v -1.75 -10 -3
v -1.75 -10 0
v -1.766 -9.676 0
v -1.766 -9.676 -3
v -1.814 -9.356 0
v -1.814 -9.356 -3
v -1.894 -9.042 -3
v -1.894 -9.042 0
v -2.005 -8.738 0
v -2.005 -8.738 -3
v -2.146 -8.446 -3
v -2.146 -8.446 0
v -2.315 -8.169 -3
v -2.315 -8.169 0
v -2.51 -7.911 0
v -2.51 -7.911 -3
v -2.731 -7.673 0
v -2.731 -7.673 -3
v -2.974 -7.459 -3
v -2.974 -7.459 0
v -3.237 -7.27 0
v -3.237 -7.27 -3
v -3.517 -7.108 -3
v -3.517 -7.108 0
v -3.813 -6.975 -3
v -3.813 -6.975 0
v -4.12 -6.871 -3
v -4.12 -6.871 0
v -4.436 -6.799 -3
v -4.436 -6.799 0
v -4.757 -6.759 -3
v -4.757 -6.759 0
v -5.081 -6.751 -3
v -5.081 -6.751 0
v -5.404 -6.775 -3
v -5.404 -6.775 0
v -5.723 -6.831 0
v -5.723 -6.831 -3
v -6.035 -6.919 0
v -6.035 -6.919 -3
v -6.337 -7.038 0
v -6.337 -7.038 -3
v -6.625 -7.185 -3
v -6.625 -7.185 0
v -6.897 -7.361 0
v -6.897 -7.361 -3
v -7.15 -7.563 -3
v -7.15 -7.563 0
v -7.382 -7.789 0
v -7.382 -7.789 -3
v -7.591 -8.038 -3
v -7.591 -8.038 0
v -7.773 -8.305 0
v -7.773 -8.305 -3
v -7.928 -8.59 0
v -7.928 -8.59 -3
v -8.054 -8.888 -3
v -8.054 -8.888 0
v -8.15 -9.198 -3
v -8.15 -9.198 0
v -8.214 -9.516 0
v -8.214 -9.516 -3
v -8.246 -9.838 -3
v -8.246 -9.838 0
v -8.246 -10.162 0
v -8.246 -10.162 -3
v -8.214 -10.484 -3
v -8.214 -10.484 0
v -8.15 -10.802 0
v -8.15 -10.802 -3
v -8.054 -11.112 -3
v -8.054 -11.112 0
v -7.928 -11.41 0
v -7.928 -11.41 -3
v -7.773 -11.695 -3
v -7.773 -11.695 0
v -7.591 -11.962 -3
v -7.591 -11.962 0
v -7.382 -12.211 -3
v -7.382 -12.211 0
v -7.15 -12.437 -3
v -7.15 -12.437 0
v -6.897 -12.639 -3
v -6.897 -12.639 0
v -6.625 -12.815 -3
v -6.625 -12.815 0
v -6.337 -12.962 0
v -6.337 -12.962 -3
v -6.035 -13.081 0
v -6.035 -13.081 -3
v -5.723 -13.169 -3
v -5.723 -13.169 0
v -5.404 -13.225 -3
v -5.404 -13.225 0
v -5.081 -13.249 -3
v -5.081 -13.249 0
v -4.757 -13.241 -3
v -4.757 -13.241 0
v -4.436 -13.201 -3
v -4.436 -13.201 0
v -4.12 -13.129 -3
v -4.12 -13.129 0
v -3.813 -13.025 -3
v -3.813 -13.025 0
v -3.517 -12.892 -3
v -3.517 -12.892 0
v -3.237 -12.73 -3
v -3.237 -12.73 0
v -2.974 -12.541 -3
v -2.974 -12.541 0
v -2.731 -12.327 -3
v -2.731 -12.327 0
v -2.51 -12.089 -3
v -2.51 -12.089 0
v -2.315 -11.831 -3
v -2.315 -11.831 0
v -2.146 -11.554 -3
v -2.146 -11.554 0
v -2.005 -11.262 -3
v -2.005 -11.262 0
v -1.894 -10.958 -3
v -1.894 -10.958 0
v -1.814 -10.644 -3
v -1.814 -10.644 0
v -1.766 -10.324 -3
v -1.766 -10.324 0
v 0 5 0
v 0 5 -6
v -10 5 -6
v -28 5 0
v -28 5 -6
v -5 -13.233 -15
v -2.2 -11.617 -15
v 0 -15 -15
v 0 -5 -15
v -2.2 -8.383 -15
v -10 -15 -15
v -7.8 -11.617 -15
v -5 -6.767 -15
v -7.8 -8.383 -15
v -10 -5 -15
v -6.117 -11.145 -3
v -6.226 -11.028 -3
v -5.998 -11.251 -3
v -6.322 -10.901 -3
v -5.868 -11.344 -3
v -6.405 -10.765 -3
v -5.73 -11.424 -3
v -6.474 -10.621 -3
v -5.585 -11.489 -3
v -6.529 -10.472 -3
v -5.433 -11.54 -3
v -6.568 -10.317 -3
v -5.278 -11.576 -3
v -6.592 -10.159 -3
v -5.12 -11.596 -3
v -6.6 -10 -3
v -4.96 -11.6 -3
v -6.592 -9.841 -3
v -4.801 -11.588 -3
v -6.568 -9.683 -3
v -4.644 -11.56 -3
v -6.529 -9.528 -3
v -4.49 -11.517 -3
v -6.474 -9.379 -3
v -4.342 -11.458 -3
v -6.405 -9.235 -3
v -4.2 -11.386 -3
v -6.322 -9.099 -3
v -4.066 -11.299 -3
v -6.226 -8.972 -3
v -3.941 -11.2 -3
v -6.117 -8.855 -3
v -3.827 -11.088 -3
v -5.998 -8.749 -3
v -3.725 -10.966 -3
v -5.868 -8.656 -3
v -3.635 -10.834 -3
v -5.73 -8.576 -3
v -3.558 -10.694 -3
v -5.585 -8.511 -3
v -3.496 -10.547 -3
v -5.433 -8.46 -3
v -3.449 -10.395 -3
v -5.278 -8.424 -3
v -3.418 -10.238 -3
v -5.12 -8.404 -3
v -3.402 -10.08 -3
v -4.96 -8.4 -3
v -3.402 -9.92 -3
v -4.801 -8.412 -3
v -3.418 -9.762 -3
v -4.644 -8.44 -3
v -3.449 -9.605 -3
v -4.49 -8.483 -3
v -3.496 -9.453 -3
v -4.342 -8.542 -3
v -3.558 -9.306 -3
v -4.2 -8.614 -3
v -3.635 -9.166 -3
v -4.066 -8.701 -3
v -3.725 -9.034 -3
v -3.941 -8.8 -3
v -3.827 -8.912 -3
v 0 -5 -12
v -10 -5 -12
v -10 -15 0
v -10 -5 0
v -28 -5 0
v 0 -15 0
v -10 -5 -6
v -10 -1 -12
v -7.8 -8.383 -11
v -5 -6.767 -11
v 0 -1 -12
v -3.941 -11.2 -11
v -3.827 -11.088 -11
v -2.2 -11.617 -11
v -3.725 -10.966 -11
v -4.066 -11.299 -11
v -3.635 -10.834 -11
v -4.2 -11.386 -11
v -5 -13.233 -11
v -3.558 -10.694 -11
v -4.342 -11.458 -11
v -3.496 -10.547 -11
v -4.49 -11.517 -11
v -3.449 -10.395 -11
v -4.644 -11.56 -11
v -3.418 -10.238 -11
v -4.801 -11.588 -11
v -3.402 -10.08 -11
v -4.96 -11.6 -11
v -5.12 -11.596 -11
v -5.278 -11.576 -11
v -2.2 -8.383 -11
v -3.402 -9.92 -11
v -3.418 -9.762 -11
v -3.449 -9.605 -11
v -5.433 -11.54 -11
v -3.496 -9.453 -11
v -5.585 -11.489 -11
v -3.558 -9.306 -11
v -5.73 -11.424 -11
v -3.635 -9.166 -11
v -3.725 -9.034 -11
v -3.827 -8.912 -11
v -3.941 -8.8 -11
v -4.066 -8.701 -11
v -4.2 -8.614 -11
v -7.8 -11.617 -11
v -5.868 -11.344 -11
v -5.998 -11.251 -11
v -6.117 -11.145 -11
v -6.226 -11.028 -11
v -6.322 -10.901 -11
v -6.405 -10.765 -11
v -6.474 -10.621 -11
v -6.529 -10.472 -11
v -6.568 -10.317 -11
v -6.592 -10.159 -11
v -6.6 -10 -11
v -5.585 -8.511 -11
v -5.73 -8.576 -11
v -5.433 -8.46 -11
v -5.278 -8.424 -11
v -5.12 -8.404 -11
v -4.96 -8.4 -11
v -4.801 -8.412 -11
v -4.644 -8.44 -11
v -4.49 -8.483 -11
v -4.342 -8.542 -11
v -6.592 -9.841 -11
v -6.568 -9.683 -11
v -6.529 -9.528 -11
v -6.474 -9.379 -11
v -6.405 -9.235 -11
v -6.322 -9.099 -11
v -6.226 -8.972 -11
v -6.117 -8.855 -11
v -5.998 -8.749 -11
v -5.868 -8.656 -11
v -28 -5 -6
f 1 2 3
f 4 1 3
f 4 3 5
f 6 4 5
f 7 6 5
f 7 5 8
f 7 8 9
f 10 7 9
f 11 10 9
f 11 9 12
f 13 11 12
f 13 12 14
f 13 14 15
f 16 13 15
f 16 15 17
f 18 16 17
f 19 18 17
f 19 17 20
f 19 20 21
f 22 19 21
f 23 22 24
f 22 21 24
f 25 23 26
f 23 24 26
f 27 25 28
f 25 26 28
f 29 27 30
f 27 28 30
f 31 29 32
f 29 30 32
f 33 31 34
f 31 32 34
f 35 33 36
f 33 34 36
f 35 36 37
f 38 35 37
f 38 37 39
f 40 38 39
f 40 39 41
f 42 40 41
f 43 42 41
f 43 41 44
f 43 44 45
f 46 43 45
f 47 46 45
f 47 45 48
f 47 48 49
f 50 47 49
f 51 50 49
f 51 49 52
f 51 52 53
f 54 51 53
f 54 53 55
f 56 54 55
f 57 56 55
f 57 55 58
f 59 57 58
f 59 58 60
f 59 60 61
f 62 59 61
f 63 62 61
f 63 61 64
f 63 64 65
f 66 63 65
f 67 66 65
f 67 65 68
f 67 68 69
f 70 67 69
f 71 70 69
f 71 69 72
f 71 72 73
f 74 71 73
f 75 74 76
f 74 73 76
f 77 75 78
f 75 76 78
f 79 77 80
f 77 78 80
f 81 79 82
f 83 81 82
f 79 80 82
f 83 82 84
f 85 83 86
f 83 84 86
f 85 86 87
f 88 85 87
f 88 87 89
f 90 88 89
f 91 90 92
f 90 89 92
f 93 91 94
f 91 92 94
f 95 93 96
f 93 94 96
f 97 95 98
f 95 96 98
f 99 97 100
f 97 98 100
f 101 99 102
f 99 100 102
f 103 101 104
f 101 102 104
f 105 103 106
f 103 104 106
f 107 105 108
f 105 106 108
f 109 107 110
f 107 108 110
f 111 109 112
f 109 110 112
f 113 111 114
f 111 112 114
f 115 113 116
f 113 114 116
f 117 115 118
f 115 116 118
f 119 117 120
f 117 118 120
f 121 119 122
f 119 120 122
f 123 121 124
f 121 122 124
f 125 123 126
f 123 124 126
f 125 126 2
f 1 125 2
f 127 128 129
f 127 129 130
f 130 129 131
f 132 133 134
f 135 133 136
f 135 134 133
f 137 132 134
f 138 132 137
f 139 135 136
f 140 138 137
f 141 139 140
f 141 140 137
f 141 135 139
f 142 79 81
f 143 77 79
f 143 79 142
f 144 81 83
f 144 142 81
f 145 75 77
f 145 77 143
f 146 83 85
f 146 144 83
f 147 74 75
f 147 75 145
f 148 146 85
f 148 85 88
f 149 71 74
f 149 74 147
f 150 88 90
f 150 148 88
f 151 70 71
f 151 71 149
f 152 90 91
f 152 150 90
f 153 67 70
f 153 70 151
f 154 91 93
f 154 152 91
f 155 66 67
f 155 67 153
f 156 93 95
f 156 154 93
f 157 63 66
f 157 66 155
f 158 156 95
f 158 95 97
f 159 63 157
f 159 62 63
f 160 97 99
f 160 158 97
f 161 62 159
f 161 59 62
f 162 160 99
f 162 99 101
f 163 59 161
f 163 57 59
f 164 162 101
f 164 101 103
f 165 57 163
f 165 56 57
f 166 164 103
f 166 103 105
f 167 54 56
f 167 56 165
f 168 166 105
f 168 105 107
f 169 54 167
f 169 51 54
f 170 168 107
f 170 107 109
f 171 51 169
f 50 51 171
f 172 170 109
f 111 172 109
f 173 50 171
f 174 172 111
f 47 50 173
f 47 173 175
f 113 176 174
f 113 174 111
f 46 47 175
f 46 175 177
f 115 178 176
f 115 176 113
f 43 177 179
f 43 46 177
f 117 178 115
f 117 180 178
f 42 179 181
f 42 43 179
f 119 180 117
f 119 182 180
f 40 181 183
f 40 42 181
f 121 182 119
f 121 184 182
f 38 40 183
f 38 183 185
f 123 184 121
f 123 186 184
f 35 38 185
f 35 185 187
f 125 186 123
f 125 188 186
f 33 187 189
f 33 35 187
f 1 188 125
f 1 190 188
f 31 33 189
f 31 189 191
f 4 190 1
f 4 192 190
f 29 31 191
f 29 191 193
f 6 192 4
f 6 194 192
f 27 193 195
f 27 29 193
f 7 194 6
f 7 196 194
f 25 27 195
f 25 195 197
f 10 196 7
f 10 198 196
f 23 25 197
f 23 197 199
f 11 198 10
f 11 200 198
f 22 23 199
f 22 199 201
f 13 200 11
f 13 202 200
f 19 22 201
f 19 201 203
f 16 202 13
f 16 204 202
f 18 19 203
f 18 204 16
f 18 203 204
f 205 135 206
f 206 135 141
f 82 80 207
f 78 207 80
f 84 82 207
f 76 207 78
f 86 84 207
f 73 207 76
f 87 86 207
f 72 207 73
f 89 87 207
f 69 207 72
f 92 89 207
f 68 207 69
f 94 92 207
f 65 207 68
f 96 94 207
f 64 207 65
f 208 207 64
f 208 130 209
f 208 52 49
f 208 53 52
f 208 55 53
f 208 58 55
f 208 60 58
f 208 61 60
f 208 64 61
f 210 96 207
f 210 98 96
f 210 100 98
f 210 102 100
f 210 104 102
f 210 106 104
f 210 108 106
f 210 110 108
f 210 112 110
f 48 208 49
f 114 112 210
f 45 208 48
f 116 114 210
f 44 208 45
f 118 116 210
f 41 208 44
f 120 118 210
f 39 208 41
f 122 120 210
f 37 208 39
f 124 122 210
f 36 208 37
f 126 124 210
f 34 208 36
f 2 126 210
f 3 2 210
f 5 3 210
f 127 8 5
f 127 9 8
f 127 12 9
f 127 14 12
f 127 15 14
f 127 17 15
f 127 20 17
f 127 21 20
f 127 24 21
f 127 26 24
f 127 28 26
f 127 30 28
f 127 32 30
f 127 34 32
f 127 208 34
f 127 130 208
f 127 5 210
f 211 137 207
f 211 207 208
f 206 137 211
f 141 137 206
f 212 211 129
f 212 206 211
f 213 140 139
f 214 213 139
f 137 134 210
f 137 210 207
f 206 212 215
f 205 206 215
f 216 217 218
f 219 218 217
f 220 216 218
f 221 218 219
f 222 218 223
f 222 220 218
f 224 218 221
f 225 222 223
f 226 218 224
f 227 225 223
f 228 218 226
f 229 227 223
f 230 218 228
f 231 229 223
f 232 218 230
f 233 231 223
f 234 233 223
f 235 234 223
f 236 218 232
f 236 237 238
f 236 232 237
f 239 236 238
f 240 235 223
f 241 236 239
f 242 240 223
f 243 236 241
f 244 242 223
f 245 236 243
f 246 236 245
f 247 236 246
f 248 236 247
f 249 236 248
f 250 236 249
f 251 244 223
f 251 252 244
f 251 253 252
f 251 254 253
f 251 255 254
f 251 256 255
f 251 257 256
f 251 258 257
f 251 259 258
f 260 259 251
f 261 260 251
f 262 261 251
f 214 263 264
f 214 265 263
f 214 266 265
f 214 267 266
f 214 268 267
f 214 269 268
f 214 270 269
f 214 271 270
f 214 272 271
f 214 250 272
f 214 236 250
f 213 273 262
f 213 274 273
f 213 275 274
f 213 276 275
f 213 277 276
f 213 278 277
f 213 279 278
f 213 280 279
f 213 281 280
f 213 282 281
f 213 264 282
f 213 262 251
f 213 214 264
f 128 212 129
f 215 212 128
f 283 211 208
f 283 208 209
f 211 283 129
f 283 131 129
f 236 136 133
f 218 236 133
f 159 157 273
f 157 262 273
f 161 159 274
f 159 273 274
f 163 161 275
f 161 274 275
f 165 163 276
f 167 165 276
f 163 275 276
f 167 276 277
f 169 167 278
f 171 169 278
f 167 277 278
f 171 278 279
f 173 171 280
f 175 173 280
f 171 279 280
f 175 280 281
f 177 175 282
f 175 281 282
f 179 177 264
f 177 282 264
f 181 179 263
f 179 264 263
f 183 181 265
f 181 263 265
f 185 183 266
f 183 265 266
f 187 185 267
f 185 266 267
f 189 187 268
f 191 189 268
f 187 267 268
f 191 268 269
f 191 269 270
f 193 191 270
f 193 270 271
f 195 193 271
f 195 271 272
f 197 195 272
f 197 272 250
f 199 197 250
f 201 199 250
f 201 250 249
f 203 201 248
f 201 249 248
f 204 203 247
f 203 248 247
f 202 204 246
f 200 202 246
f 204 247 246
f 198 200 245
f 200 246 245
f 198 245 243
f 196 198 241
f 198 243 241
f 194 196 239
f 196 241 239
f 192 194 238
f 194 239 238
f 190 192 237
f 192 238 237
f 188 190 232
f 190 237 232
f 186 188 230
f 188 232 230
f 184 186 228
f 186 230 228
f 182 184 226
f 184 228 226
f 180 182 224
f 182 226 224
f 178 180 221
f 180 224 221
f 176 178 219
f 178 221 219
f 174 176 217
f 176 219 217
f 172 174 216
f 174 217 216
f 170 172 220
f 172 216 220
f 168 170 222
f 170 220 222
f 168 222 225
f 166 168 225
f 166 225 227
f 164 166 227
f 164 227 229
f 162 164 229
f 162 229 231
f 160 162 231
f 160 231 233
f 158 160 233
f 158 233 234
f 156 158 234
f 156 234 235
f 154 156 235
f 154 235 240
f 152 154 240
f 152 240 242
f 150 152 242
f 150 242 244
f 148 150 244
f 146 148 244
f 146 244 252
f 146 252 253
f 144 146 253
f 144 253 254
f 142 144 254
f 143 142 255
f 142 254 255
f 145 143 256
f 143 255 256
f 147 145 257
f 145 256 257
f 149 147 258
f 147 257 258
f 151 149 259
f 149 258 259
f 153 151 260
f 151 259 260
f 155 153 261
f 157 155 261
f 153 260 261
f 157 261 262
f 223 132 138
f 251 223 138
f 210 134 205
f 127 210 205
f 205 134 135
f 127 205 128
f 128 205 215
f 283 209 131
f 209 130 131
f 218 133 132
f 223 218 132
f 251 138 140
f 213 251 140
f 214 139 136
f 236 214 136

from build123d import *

# Parameters (mm, degrees)
BOSS_EXTRUDE1_DEPTH                                 = 5
SKETCH4_W                                           = 10
SKETCH4_H                                           = 12
BOSS_EXTRUDE2_DEPTH                                 = 10
CBORE_FOR_M3_HEX_SOCKET_HEAD_CAP_SCREW1_D           = 3.2
CBORE_FOR_M3_HEX_SOCKET_HEAD_CAP_SCREW1_CBORE_D     = 6.5
CBORE_FOR_M3_HEX_SOCKET_HEAD_CAP_SCREW1_CBORE_DEPTH = 3
CHAMFER1_SIZE                                       = 6
BOSS_EXTRUDE3_START                                 = 3
SKETCH5_W                                           = 10
SKETCH5_H                                           = 10
SKETCH5_R                                           = 1.6
BOSS_EXTRUDE3_DEPTH                                 = 3
CUT_EXTRUDE1_DEPTH                                  = 4


with BuildPart() as part:
    # Sketch1 → Boss-Extrude1 (new, symmetric)
    with BuildSketch(Plane(origin=(0, 0, 0), x_dir=(1, 0, 0), z_dir=(0, 1, 0))):
        Polygon((0, 0), (-28, 0), (-28, 6), (-10, 6), (-10, 12), (0, 12), align=None)
    extrude(amount=BOSS_EXTRUDE1_DEPTH, both=True)

    # Sketch4 → Boss-Extrude2 (add)
    with BuildSketch(Plane.XZ.offset(5)):
        with Locations((-5, -6)):
            Rectangle(SKETCH4_W, SKETCH4_H)
    extrude(amount=BOSS_EXTRUDE2_DEPTH)

    # CBORE for M3 Hex Socket Head Cap Screw1 (through all)
    with Locations(Plane.XY):
        with Locations((-5, -10)):
            CounterBoreHole(CBORE_FOR_M3_HEX_SOCKET_HEAD_CAP_SCREW1_D / 2, CBORE_FOR_M3_HEX_SOCKET_HEAD_CAP_SCREW1_CBORE_D / 2, CBORE_FOR_M3_HEX_SOCKET_HEAD_CAP_SCREW1_CBORE_DEPTH)

    # Chamfer1
    chamfer1_edges = [part.edges().sort_by_distance(p)[0] for p in [
        (-5, 5, -12),
    ]]
    chamfer(chamfer1_edges, length=CHAMFER1_SIZE)

    # Sketch5 → Boss-Extrude3 (add)
    with BuildSketch(Plane(origin=(0, 0, -12), x_dir=(-1, 0, 0), z_dir=(0, 0, -1)).offset(BOSS_EXTRUDE3_START)):
        with Locations((5, -10)):
            Rectangle(SKETCH5_W, SKETCH5_H)
        with Locations(Location((5, -10, 0), (0, 0, 180))):
            Circle(SKETCH5_R, mode=Mode.SUBTRACT)
    extrude(amount=-BOSS_EXTRUDE3_DEPTH)

    # Sketch6 → Cut-Extrude1 (cut)
    with BuildSketch(Plane(origin=(0, 0, -15), x_dir=(-1, 0, 0), z_dir=(0, 0, -1))):
        Polygon((5, -13.233161507), (7.8, -11.616580754), (7.8, -8.383419246), (5, -6.766838493), (2.2, -8.383419246), (2.2, -11.616580754), align=None)
    extrude(amount=-CUT_EXTRUDE1_DEPTH, mode=Mode.SUBTRACT)


solid = part.part
